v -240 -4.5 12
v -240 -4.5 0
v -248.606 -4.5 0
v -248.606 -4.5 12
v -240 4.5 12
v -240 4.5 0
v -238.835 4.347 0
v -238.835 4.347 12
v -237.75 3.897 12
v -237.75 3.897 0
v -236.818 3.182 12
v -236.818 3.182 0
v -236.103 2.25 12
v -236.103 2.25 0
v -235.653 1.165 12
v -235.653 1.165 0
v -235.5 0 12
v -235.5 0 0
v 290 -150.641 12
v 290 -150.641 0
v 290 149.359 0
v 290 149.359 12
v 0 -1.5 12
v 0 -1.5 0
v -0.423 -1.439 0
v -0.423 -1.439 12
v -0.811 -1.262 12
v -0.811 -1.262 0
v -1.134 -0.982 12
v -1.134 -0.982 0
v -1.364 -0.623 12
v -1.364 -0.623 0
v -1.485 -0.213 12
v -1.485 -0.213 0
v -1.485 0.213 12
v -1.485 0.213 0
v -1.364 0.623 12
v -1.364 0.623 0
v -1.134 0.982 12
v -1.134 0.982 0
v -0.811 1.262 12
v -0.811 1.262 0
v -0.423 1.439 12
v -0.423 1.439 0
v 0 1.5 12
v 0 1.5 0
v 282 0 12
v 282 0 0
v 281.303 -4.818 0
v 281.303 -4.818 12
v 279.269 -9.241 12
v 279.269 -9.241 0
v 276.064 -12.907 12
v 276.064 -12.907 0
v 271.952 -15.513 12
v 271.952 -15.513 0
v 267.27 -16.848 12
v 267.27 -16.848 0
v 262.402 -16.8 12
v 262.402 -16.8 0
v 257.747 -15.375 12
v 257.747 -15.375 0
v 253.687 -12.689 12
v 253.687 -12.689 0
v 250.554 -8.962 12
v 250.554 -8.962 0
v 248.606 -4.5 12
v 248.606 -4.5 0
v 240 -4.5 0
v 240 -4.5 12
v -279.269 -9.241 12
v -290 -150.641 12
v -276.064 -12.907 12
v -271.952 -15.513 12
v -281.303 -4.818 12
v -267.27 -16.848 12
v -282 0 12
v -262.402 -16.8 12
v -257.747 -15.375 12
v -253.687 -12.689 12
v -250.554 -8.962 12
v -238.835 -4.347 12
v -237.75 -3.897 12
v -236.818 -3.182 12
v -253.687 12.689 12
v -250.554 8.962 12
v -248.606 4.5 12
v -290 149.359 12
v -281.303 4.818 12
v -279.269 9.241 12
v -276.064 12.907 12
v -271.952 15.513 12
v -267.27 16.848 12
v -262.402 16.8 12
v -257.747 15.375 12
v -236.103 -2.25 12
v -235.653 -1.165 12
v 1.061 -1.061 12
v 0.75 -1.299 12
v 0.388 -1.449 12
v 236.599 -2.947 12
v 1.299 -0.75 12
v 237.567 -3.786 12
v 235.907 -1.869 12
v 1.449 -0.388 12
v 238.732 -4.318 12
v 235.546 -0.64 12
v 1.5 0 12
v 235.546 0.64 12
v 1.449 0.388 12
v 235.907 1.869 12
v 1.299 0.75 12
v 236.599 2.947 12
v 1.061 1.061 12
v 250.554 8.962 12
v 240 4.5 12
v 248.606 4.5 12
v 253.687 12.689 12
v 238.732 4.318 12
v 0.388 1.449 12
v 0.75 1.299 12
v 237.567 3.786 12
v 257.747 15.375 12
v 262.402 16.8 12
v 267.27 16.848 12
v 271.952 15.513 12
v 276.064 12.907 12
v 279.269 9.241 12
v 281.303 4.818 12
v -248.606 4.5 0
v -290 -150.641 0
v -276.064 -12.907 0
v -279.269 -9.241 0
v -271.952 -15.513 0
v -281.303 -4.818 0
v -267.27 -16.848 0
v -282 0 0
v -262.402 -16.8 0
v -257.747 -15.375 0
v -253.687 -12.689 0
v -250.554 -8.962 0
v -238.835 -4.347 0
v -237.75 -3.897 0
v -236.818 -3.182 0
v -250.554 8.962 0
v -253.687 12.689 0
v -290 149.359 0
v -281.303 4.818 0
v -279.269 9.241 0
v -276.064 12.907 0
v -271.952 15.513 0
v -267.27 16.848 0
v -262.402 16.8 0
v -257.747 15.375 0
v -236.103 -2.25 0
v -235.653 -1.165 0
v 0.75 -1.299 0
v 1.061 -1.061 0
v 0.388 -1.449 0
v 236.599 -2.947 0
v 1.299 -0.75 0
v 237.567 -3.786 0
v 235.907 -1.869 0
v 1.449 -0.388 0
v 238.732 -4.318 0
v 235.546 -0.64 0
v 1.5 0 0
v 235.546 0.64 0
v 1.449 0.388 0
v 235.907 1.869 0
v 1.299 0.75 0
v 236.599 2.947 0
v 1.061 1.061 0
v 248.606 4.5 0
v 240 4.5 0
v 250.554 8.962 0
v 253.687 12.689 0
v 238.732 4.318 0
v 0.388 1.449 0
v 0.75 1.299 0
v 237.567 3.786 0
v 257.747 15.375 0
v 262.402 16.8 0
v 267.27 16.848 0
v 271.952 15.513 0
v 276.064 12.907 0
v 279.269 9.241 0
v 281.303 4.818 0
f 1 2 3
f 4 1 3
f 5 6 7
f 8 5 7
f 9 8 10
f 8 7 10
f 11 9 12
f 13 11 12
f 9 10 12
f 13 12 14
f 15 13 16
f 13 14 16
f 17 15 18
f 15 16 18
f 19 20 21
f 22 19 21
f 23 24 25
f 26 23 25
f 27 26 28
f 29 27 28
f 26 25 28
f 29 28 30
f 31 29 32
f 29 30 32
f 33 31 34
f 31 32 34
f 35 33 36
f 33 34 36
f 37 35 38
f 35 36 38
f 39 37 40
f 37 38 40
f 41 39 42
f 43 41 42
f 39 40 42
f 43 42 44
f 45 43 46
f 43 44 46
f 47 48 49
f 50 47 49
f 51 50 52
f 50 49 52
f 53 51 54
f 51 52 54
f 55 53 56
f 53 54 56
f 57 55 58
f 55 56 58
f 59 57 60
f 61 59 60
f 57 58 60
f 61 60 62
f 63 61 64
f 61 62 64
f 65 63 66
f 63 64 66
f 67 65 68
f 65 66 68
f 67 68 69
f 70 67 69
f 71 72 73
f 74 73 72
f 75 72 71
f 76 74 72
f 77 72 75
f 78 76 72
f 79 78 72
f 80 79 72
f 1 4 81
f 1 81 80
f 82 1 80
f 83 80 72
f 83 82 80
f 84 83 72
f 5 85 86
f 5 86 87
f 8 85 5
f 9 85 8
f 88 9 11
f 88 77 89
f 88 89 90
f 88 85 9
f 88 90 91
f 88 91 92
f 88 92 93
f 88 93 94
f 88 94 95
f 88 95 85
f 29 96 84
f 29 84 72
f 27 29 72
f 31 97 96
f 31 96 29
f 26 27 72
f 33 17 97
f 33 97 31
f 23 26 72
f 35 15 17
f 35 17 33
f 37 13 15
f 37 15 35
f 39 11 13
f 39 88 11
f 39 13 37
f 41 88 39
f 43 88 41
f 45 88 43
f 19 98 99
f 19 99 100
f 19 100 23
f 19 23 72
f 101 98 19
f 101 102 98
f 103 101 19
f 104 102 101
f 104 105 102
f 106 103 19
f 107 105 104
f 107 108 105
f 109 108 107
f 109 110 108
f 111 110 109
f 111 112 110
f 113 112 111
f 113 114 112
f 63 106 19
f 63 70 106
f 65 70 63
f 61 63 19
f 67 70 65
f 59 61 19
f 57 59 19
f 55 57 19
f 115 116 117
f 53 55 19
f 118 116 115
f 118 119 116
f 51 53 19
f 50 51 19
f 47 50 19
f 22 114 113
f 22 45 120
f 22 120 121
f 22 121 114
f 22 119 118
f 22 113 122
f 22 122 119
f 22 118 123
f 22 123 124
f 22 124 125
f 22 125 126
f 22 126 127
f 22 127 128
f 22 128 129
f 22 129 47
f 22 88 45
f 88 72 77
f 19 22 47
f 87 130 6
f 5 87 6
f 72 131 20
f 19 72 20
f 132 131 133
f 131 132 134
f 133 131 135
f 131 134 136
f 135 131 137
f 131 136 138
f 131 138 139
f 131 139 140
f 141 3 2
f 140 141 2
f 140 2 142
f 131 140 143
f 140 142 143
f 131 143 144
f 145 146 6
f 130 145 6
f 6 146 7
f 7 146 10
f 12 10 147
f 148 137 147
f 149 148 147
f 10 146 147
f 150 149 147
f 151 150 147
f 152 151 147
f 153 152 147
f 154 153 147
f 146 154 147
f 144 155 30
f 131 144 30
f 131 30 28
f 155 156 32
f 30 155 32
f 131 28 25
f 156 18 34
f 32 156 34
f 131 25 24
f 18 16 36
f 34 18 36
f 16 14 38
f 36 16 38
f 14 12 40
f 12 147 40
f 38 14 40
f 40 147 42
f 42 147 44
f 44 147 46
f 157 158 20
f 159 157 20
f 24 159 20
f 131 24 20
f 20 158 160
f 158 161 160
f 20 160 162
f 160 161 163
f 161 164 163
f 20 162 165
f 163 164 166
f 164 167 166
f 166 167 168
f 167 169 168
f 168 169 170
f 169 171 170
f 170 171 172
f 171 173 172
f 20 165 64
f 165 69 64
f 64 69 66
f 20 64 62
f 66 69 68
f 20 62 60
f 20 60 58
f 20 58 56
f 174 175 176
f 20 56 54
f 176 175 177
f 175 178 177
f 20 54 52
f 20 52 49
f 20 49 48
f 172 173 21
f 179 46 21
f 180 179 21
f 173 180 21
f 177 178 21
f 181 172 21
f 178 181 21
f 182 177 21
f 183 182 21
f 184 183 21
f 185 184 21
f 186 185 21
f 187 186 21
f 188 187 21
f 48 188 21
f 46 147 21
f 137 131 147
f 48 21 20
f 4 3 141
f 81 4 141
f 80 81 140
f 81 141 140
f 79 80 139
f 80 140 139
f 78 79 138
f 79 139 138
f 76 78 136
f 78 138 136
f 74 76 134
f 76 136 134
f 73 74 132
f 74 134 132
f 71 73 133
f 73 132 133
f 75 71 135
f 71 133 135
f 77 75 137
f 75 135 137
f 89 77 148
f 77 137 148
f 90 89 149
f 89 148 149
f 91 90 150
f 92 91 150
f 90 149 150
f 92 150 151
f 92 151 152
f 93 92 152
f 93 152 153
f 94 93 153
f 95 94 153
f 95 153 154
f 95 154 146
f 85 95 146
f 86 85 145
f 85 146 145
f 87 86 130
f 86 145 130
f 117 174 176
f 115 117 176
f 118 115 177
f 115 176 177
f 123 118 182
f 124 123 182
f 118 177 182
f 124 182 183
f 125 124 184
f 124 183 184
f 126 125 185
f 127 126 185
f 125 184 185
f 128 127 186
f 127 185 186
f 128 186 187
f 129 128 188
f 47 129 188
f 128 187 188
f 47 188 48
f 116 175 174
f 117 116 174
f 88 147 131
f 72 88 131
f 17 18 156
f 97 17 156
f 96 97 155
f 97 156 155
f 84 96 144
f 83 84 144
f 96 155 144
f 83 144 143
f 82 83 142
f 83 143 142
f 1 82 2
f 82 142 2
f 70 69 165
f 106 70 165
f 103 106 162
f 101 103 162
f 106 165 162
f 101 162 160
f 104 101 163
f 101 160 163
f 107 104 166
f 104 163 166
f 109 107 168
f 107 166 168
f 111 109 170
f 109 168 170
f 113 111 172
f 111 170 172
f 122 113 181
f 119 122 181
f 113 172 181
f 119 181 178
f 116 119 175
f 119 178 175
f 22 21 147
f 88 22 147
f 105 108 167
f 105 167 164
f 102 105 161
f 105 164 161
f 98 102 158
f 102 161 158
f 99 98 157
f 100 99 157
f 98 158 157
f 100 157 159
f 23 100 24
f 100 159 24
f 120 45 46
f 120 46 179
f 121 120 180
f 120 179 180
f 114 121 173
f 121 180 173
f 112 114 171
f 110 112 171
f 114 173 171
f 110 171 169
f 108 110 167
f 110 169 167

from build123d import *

# Parameters (mm, degrees)
F1_DEPTH = 12


with BuildPart() as f1:
    # F0 (on Top) → F1 (new body)
    with BuildSketch(Plane.XY):
        with BuildLine():
            Line((290, 149.358979), (0, 149.358979))
            Line((0, 149.358979), (0, 1.5))
            ThreePointArc((0, 1.5), (1.06066, 1.06066), (1.5, 0))
            ThreePointArc((1.5, 0), (1.06066, -1.06066), (0, -1.5))
            Line((0, -1.5), (0, -150.641021))
            Line((0, -150.641021), (290, -150.641021))
            Line((290, -150.641021), (290, 149.358979))
        make_face()
        with BuildLine():
            ThreePointArc((240, -4.5), (235.5, 0), (240, 4.5))
            Line((240, 4.5), (248.606404, 4.5))
            ThreePointArc((248.606404, 4.5), (267.270337, 16.847717), (282, 0))
            ThreePointArc((282, 0), (267.270337, -16.847717), (248.606404, -4.5))
            Line((248.606404, -4.5), (240, -4.5))
        make_face(mode=Mode.SUBTRACT)
        with BuildLine():
            Line((0, 1.5), (0, 149.358979))
            Line((0, 149.358979), (-290, 149.358979))
            Line((-290, 149.358979), (-290, -150.641021))
            Line((-290, -150.641021), (0, -150.641021))
            Line((0, -150.641021), (0, -1.5))
            ThreePointArc((0, -1.5), (-1.5, 0), (0, 1.5))
        make_face()
        with BuildLine():
            ThreePointArc((-240, 4.5), (-236.818019, 3.181981), (-235.5, 0))
            ThreePointArc((-235.5, 0), (-236.818019, -3.181981), (-240, -4.5))
            Line((-240, -4.5), (-248.606404, -4.5))
            ThreePointArc((-248.606404, -4.5), (-282, 0), (-248.606404, 4.5))
            Line((-248.606404, 4.5), (-240, 4.5))
        make_face(mode=Mode.SUBTRACT)
    extrude(amount=F1_DEPTH)


solid = f1.part
